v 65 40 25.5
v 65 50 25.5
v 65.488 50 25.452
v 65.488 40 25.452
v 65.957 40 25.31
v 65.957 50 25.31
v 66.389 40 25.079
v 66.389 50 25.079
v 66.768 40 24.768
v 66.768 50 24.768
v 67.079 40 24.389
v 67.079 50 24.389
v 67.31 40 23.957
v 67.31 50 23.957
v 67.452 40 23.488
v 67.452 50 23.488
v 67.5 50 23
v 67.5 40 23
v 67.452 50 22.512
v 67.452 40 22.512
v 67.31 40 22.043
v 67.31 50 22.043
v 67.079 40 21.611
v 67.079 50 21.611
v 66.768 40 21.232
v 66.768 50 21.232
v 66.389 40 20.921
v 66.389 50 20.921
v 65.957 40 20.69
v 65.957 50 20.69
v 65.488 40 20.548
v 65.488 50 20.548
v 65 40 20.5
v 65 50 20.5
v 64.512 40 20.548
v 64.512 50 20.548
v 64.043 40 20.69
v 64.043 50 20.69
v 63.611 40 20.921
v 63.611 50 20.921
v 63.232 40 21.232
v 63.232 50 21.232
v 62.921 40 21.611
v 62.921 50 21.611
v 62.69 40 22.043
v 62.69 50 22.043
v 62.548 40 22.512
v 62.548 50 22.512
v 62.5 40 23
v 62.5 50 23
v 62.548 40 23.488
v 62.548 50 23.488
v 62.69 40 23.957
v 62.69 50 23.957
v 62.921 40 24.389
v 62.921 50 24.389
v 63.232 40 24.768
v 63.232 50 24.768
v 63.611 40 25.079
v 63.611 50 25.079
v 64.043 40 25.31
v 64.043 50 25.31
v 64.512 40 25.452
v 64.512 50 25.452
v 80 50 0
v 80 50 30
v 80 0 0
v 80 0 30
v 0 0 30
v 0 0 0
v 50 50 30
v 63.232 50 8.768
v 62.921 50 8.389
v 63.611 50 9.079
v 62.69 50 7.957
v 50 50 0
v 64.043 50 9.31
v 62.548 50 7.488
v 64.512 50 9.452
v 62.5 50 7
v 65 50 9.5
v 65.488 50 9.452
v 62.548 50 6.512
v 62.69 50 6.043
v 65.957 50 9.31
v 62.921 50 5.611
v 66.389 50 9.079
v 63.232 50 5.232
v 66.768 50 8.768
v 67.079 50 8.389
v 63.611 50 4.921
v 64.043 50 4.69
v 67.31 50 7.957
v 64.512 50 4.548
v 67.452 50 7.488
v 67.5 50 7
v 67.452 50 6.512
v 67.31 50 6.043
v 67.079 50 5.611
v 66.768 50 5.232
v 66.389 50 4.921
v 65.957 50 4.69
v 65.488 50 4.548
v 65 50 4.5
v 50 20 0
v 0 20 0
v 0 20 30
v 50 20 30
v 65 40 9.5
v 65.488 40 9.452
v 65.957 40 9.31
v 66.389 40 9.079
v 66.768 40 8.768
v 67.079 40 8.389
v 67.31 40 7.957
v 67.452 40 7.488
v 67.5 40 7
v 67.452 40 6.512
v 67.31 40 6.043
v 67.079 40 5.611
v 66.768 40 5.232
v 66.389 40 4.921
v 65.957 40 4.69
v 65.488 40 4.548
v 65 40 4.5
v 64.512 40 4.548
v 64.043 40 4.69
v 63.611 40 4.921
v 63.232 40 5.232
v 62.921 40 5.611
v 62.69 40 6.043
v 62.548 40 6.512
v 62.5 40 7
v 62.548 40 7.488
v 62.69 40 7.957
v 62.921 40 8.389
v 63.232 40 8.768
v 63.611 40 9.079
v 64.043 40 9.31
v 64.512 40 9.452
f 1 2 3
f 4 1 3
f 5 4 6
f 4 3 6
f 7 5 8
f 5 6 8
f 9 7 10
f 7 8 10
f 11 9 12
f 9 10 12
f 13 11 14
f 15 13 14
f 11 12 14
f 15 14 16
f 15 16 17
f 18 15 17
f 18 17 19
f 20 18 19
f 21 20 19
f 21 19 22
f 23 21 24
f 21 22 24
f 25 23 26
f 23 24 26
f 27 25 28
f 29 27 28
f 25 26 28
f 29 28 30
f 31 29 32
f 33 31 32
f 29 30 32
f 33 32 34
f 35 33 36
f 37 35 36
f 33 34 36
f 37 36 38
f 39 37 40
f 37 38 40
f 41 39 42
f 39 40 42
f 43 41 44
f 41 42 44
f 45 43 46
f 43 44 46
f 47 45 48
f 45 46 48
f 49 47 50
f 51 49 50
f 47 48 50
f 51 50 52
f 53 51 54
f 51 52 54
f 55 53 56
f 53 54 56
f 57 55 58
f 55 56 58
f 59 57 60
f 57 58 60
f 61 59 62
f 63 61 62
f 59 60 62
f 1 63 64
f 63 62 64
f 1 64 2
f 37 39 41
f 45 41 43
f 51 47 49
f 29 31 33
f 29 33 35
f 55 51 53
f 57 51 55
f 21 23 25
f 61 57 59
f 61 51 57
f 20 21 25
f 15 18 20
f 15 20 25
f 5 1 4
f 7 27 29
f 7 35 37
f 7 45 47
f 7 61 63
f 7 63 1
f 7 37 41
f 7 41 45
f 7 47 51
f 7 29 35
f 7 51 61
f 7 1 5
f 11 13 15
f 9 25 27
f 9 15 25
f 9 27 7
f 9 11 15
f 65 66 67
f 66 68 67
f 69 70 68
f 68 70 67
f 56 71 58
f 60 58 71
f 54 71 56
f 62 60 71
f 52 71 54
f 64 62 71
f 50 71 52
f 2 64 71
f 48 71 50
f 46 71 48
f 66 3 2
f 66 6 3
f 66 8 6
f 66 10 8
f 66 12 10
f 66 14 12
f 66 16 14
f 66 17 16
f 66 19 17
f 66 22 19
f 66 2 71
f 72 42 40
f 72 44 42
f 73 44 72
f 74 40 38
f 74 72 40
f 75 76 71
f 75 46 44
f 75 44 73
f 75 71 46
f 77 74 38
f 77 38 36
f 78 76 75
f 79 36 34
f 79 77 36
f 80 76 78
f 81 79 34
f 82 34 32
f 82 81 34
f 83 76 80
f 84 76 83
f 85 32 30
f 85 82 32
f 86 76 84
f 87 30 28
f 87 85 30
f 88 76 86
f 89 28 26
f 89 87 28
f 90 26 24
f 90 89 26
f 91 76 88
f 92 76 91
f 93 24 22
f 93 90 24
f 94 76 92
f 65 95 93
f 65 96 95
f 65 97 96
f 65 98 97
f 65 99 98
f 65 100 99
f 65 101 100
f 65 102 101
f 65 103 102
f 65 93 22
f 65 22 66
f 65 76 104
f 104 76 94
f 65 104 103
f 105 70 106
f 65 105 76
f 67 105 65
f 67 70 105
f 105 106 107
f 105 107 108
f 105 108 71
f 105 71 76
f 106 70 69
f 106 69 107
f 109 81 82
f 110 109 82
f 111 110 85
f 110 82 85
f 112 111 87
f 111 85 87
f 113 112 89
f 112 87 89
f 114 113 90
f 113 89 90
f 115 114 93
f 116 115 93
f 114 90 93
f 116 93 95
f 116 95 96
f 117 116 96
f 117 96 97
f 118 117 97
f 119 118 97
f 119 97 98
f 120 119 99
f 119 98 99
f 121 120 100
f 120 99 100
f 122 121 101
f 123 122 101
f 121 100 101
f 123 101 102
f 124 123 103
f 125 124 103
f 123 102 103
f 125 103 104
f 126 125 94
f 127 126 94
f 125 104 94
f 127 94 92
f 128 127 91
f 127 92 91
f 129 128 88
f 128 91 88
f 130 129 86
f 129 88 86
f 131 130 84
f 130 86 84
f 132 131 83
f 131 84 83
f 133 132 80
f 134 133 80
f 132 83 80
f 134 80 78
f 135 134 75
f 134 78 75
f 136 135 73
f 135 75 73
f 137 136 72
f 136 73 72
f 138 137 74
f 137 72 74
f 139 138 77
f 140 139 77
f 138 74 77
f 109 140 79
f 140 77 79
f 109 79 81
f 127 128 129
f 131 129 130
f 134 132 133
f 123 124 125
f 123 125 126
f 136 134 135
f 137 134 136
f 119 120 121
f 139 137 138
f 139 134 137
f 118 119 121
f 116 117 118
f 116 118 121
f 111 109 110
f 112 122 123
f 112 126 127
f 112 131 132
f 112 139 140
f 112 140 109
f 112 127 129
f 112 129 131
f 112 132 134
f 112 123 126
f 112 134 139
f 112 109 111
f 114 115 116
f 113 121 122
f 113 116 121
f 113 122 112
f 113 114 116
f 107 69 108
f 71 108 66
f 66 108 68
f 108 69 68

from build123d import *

# Parameters (mm, degrees)
SKETCH1_W           = 80
SKETCH1_H           = 20
BOSS_EXTRUDE1_DEPTH = 30
SKETCH13_W          = 30
SKETCH13_H          = 30
BOSS_EXTRUDE7_DEPTH = 30
SKETCH14_R          = 2.5
CUT_EXTRUDE1_DEPTH  = 10


with BuildPart() as part:
    # Sketch1 → Boss-Extrude1 (new body)
    with BuildSketch(Plane.XY):
        with Locations((40, 10)):
            Rectangle(SKETCH1_W, SKETCH1_H)
    extrude(amount=BOSS_EXTRUDE1_DEPTH)

    # Sketch13 → Boss-Extrude7 (add)
    with BuildSketch(Plane(origin=(0, 20, 0), x_dir=(1, 0, 0), z_dir=(0, 1, 0))):
        with Locations((65, -15)):
            Rectangle(SKETCH13_W, SKETCH13_H)
    extrude(amount=BOSS_EXTRUDE7_DEPTH)

    # Sketch14 → Cut-Extrude1 (cut)
    with BuildSketch(Plane(origin=(0, 50, 0), x_dir=(1, 0, 0), z_dir=(0, 1, 0))):
        with Locations(Location((65, -7, 0), (0, 0, 270))):
            Circle(SKETCH14_R)
        with Locations(Location((65, -23, 0), (0, 0, 270))):
            Circle(SKETCH14_R)
    extrude(amount=-CUT_EXTRUDE1_DEPTH, mode=Mode.SUBTRACT)


solid = part.part
